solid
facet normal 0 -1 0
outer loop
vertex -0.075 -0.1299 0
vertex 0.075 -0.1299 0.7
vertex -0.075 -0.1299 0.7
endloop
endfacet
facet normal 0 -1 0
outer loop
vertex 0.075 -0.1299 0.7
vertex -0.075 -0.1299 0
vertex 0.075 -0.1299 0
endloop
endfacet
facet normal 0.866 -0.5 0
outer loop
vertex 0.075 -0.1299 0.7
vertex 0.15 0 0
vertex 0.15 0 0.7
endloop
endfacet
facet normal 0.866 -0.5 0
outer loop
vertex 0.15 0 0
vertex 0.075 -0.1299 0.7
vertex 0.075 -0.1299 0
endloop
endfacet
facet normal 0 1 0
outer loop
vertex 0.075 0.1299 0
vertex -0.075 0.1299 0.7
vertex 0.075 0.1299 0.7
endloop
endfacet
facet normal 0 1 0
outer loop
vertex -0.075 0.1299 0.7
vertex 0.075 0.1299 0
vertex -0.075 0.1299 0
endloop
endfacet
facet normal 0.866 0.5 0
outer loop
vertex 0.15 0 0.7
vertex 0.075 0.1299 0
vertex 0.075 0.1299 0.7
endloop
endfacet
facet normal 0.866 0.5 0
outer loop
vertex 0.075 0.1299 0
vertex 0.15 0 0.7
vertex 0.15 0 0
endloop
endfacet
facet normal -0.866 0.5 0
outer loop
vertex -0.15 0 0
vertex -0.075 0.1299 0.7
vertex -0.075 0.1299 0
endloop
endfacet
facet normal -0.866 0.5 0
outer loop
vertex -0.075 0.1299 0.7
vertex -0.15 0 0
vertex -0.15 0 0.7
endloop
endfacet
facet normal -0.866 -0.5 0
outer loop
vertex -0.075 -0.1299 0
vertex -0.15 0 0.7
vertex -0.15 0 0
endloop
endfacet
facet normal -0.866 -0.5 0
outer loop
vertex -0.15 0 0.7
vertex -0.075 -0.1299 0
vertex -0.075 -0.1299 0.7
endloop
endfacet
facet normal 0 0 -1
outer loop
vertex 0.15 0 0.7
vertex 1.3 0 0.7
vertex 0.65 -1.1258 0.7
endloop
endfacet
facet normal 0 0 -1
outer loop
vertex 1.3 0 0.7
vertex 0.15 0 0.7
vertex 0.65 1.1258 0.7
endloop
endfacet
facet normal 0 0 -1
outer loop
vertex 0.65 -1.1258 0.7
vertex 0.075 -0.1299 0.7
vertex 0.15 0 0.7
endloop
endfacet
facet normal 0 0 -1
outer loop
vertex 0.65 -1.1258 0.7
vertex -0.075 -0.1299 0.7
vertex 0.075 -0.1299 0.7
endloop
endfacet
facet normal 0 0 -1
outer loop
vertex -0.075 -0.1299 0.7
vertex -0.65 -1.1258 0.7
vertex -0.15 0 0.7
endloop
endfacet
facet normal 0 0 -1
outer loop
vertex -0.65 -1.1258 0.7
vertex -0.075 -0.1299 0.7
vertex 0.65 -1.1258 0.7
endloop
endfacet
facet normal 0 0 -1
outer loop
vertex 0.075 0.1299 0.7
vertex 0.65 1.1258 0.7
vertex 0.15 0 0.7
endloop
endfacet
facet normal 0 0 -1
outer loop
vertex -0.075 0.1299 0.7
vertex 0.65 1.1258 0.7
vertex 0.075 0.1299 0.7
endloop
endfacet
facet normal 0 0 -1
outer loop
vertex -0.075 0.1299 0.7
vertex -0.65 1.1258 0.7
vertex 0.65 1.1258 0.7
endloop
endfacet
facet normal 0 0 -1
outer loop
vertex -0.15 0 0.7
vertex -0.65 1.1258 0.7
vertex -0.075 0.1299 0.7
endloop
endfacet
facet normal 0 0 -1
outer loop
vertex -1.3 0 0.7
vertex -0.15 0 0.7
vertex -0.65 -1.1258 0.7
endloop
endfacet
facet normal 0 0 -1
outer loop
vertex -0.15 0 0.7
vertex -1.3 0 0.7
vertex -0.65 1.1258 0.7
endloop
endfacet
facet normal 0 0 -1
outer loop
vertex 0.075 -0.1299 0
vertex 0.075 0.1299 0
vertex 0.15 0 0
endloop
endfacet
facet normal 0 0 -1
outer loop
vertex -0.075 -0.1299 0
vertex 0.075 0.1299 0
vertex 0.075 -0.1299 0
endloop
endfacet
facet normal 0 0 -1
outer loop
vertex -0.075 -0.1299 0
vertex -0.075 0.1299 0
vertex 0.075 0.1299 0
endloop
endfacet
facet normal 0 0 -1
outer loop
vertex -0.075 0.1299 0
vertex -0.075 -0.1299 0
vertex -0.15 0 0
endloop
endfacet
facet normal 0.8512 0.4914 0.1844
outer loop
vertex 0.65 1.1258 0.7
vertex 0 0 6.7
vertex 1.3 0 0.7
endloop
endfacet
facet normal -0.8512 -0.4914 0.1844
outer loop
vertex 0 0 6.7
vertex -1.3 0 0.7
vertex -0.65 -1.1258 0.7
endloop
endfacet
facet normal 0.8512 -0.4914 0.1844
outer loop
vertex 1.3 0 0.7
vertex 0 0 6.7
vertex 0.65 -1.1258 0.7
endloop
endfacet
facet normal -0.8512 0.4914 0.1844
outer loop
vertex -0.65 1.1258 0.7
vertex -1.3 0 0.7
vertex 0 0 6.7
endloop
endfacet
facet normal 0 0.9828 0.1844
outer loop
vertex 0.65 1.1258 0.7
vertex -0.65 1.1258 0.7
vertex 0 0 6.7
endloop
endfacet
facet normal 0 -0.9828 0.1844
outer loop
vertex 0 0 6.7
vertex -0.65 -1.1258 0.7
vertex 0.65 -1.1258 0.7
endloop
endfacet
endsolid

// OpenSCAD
// Conifer variant 1 — tall slender. Narrower canopy on a slightly taller
// trunk; reads as the "lodgepole pine" of the three variants.
// Conventions, units, and axis docs: see models-src/README.md.

$fn = 6;

trunk_r   = 0.15;
trunk_h   = 0.70;
canopy_r  = 1.30;
canopy_h  = 6.00;

module tree2() {
    color("SaddleBrown")
        cylinder(h = trunk_h, r = trunk_r);
    color("DarkGreen")
        translate([0, 0, trunk_h])
            cylinder(h = canopy_h, r1 = canopy_r, r2 = 0);
}

tree2();
